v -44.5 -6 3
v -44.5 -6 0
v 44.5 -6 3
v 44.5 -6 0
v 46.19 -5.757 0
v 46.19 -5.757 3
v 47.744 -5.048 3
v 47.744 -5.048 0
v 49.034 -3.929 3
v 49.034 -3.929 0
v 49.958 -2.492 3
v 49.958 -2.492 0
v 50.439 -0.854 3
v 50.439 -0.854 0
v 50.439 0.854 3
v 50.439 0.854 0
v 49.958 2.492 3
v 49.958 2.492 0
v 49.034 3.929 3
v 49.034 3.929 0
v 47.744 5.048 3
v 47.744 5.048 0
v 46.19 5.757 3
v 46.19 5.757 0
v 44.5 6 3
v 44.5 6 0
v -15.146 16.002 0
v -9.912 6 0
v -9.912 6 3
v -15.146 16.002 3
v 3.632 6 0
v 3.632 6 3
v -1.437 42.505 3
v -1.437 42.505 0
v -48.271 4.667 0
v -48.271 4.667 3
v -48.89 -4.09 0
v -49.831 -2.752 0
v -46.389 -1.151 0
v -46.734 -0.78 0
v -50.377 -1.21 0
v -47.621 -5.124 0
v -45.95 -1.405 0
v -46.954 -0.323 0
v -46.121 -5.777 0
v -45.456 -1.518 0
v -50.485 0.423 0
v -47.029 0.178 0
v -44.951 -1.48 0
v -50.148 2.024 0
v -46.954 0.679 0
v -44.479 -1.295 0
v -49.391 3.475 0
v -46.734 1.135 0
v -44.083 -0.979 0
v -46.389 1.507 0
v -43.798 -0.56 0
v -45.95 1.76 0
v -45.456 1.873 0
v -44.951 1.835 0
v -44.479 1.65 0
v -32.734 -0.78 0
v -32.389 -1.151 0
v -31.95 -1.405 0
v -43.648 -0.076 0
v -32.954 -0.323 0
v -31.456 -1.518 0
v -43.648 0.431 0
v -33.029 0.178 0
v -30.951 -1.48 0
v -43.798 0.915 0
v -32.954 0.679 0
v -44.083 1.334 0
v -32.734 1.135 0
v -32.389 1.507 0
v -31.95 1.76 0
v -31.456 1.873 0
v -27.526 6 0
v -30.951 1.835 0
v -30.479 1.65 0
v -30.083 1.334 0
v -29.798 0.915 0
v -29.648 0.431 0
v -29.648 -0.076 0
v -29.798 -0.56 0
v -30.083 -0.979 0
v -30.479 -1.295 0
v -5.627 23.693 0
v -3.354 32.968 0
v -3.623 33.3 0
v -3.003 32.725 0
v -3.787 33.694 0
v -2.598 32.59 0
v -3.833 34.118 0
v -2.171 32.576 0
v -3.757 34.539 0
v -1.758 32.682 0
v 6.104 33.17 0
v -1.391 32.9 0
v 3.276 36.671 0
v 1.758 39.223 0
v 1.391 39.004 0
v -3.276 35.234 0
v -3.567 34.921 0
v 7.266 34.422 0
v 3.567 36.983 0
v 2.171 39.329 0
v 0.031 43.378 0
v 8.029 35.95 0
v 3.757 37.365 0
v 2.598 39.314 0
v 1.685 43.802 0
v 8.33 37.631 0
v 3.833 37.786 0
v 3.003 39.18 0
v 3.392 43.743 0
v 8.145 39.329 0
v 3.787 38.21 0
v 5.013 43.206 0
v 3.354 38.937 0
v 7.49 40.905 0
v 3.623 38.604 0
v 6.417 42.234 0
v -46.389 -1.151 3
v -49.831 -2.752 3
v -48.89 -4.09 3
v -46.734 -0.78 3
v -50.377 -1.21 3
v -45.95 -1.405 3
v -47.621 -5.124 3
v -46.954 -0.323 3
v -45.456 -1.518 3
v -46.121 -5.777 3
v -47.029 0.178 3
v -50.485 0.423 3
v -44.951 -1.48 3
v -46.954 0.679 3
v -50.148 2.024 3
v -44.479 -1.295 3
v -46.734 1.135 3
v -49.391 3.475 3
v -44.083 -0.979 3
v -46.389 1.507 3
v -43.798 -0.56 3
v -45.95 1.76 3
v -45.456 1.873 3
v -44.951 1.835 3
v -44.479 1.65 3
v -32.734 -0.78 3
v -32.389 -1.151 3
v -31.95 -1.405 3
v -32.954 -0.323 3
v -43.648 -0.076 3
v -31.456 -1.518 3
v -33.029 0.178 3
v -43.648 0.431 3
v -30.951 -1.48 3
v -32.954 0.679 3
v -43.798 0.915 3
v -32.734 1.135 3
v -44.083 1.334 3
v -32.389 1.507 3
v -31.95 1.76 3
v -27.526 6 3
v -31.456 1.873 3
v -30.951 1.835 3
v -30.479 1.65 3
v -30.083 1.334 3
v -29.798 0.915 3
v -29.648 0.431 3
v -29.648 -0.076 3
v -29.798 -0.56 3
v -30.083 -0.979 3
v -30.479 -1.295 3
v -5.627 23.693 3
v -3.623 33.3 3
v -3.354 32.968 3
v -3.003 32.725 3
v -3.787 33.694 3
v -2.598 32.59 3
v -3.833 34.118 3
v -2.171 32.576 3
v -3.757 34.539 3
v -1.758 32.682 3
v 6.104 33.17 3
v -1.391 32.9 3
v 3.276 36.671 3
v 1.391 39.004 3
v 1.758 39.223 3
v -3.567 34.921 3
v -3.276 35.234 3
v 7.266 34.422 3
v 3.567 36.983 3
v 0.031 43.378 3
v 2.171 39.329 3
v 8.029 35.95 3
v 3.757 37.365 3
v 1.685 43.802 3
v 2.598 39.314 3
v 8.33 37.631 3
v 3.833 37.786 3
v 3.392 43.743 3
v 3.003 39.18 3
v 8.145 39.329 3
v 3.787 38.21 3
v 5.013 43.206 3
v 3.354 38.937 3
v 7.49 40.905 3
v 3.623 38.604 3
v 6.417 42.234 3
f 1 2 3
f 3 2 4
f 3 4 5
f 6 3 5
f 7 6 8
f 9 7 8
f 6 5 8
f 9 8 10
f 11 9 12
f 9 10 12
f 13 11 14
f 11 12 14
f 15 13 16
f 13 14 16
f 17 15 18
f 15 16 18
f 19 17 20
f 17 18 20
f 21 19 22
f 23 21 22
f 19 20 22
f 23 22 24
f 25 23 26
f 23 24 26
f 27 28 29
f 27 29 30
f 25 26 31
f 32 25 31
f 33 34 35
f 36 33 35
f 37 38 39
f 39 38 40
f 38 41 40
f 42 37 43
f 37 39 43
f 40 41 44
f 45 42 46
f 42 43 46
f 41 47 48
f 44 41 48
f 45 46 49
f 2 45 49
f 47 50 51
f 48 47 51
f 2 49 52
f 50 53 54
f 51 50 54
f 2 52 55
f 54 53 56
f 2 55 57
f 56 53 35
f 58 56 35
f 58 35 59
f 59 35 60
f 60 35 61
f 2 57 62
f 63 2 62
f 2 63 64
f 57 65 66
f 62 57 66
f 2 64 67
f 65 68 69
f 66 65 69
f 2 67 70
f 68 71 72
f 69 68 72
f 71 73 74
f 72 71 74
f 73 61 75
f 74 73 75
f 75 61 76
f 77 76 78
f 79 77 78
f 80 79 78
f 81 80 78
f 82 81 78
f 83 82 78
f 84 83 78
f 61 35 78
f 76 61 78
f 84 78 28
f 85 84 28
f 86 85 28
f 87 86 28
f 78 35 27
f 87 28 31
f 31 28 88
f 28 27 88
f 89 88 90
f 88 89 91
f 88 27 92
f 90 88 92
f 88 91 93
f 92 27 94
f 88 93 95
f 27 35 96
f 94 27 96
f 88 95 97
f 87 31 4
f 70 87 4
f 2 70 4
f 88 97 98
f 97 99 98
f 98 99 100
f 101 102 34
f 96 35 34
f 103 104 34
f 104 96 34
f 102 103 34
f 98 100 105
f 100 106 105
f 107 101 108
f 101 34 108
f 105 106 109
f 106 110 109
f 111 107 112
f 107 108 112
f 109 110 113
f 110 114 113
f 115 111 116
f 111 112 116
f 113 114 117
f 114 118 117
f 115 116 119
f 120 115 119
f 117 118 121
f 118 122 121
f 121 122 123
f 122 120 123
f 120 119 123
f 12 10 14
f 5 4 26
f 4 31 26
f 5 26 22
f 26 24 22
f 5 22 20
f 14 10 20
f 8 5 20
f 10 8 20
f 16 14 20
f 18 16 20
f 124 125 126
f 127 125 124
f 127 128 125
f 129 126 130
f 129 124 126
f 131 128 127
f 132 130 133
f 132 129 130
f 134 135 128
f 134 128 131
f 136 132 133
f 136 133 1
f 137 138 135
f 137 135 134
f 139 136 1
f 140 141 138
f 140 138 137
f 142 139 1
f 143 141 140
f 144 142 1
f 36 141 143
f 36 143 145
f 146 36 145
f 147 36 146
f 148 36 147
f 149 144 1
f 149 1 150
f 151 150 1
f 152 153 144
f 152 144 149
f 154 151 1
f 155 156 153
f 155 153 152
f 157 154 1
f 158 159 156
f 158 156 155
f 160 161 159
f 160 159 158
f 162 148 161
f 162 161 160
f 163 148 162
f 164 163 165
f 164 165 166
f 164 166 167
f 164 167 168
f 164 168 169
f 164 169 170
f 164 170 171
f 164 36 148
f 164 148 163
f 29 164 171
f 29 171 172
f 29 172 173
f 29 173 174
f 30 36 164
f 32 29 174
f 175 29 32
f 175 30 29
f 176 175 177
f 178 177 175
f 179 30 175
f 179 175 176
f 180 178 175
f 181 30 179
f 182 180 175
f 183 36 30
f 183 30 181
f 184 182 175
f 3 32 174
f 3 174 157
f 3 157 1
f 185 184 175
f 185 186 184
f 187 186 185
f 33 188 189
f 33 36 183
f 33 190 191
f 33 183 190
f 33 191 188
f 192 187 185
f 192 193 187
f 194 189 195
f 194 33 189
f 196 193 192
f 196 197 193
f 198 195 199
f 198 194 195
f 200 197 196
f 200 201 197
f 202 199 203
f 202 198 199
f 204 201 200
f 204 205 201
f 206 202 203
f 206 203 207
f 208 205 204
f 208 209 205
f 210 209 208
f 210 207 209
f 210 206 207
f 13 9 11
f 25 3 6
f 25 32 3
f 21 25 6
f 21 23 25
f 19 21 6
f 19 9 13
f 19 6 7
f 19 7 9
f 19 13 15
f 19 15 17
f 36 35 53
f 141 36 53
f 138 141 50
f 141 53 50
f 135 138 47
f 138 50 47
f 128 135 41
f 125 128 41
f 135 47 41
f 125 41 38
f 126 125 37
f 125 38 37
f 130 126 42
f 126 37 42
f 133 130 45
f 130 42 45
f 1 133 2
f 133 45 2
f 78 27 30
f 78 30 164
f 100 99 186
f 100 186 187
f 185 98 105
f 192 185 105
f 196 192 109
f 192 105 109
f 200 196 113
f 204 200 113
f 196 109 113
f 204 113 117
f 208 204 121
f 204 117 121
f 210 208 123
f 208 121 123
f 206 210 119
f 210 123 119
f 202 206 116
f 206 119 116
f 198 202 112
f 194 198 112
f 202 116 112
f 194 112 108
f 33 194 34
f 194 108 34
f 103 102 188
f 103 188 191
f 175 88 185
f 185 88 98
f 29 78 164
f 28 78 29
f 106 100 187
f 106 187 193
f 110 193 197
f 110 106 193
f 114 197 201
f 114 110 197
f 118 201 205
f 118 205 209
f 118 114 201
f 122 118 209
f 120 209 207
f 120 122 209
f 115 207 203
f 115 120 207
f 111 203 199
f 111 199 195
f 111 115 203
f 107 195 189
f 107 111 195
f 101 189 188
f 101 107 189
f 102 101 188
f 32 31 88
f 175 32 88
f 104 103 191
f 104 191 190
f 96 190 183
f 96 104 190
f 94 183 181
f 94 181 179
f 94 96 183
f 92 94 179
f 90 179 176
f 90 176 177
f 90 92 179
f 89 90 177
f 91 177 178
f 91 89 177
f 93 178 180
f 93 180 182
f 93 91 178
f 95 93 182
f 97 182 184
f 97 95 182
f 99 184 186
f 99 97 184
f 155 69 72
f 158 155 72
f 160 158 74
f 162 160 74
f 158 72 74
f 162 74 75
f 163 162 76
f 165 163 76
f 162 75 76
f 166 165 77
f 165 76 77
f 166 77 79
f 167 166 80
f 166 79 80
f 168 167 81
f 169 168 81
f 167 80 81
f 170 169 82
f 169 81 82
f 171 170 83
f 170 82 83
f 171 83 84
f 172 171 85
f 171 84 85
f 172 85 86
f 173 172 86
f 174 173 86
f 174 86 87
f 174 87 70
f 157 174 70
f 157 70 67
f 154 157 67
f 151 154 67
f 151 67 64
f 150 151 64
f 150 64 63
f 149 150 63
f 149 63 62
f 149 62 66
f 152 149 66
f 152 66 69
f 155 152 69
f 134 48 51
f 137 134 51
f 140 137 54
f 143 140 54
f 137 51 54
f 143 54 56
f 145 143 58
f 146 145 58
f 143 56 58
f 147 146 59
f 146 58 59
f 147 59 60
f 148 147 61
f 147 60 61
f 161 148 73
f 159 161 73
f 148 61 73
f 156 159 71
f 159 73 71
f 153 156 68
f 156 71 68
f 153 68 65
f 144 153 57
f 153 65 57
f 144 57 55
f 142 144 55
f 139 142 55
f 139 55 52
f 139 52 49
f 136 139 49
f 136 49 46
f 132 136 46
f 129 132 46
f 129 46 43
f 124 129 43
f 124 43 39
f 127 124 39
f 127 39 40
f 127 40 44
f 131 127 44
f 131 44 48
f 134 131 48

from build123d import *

# Parameters (mm, degrees)
BOSS_EXTRU_1_DEPTH   = 3
D_GAGEMENT_M31_D     = 3.4
D_GAGEMENT_M31_DEPTH = 10
D_GAGEMENT_M31_TIP   = 1.021463052


with BuildPart() as part:
    # Esquisse1 → Boss.-Extru.1 (new body)
    with BuildSketch(Plane.XY):
        with BuildLine():
            Line((-5.626876244, 23.692571189), (6.10421614, 33.170262072))
            ThreePointArc((6.10421614, 33.170262072), (7.000718602, 41.608051079), (-1.437070405, 42.504553542))
            Line((-1.437070405, 42.504553542), (-48.270643273, 4.667145735))
            ThreePointArc((-48.270643273, 4.667145735), (-50.15698128, -1.999640667), (-44.5, -6))
            Line((-44.5, -6), (44.5, -6))
            ThreePointArc((44.5, -6), (50.5, 0), (44.5, 6))
            Line((44.5, 6), (3.632012331, 6))
            Line((3.632012331, 6), (-5.626876244, 23.692571189))
        make_face()
        Polygon((-9.91186062, 6), (-15.146064211, 16.001904537), (-27.526006497, 6), align=None, mode=Mode.SUBTRACT)
        with BuildLine():
            ThreePointArc((-3.276233686, 35.233550968), (-3.500359301, 33.124103716), (-1.390912049, 32.8999781))
            Line((-1.390912049, 32.8999781), (3.276233686, 36.670621373))
            ThreePointArc((3.276233686, 36.670621373), (3.500359301, 38.780068625), (1.390912049, 39.00419424))
            Line((1.390912049, 39.00419424), (-3.276233686, 35.233550968))
        make_face(mode=Mode.SUBTRACT)
    extrude(amount=BOSS_EXTRU_1_DEPTH)

    # Dégagement M31
    with Locations(Plane.XY.offset(3)):
        with Locations((-45.329154162, 0.177691477), (-31.329154162, 0.177691477)):
            Hole(D_GAGEMENT_M31_D / 2, depth=D_GAGEMENT_M31_DEPTH)
            with Locations((0, 0, -(D_GAGEMENT_M31_DEPTH + D_GAGEMENT_M31_TIP / 2))):  # 118° drill point
                Cone(0, D_GAGEMENT_M31_D / 2, D_GAGEMENT_M31_TIP, mode=Mode.SUBTRACT)


solid = part.part
